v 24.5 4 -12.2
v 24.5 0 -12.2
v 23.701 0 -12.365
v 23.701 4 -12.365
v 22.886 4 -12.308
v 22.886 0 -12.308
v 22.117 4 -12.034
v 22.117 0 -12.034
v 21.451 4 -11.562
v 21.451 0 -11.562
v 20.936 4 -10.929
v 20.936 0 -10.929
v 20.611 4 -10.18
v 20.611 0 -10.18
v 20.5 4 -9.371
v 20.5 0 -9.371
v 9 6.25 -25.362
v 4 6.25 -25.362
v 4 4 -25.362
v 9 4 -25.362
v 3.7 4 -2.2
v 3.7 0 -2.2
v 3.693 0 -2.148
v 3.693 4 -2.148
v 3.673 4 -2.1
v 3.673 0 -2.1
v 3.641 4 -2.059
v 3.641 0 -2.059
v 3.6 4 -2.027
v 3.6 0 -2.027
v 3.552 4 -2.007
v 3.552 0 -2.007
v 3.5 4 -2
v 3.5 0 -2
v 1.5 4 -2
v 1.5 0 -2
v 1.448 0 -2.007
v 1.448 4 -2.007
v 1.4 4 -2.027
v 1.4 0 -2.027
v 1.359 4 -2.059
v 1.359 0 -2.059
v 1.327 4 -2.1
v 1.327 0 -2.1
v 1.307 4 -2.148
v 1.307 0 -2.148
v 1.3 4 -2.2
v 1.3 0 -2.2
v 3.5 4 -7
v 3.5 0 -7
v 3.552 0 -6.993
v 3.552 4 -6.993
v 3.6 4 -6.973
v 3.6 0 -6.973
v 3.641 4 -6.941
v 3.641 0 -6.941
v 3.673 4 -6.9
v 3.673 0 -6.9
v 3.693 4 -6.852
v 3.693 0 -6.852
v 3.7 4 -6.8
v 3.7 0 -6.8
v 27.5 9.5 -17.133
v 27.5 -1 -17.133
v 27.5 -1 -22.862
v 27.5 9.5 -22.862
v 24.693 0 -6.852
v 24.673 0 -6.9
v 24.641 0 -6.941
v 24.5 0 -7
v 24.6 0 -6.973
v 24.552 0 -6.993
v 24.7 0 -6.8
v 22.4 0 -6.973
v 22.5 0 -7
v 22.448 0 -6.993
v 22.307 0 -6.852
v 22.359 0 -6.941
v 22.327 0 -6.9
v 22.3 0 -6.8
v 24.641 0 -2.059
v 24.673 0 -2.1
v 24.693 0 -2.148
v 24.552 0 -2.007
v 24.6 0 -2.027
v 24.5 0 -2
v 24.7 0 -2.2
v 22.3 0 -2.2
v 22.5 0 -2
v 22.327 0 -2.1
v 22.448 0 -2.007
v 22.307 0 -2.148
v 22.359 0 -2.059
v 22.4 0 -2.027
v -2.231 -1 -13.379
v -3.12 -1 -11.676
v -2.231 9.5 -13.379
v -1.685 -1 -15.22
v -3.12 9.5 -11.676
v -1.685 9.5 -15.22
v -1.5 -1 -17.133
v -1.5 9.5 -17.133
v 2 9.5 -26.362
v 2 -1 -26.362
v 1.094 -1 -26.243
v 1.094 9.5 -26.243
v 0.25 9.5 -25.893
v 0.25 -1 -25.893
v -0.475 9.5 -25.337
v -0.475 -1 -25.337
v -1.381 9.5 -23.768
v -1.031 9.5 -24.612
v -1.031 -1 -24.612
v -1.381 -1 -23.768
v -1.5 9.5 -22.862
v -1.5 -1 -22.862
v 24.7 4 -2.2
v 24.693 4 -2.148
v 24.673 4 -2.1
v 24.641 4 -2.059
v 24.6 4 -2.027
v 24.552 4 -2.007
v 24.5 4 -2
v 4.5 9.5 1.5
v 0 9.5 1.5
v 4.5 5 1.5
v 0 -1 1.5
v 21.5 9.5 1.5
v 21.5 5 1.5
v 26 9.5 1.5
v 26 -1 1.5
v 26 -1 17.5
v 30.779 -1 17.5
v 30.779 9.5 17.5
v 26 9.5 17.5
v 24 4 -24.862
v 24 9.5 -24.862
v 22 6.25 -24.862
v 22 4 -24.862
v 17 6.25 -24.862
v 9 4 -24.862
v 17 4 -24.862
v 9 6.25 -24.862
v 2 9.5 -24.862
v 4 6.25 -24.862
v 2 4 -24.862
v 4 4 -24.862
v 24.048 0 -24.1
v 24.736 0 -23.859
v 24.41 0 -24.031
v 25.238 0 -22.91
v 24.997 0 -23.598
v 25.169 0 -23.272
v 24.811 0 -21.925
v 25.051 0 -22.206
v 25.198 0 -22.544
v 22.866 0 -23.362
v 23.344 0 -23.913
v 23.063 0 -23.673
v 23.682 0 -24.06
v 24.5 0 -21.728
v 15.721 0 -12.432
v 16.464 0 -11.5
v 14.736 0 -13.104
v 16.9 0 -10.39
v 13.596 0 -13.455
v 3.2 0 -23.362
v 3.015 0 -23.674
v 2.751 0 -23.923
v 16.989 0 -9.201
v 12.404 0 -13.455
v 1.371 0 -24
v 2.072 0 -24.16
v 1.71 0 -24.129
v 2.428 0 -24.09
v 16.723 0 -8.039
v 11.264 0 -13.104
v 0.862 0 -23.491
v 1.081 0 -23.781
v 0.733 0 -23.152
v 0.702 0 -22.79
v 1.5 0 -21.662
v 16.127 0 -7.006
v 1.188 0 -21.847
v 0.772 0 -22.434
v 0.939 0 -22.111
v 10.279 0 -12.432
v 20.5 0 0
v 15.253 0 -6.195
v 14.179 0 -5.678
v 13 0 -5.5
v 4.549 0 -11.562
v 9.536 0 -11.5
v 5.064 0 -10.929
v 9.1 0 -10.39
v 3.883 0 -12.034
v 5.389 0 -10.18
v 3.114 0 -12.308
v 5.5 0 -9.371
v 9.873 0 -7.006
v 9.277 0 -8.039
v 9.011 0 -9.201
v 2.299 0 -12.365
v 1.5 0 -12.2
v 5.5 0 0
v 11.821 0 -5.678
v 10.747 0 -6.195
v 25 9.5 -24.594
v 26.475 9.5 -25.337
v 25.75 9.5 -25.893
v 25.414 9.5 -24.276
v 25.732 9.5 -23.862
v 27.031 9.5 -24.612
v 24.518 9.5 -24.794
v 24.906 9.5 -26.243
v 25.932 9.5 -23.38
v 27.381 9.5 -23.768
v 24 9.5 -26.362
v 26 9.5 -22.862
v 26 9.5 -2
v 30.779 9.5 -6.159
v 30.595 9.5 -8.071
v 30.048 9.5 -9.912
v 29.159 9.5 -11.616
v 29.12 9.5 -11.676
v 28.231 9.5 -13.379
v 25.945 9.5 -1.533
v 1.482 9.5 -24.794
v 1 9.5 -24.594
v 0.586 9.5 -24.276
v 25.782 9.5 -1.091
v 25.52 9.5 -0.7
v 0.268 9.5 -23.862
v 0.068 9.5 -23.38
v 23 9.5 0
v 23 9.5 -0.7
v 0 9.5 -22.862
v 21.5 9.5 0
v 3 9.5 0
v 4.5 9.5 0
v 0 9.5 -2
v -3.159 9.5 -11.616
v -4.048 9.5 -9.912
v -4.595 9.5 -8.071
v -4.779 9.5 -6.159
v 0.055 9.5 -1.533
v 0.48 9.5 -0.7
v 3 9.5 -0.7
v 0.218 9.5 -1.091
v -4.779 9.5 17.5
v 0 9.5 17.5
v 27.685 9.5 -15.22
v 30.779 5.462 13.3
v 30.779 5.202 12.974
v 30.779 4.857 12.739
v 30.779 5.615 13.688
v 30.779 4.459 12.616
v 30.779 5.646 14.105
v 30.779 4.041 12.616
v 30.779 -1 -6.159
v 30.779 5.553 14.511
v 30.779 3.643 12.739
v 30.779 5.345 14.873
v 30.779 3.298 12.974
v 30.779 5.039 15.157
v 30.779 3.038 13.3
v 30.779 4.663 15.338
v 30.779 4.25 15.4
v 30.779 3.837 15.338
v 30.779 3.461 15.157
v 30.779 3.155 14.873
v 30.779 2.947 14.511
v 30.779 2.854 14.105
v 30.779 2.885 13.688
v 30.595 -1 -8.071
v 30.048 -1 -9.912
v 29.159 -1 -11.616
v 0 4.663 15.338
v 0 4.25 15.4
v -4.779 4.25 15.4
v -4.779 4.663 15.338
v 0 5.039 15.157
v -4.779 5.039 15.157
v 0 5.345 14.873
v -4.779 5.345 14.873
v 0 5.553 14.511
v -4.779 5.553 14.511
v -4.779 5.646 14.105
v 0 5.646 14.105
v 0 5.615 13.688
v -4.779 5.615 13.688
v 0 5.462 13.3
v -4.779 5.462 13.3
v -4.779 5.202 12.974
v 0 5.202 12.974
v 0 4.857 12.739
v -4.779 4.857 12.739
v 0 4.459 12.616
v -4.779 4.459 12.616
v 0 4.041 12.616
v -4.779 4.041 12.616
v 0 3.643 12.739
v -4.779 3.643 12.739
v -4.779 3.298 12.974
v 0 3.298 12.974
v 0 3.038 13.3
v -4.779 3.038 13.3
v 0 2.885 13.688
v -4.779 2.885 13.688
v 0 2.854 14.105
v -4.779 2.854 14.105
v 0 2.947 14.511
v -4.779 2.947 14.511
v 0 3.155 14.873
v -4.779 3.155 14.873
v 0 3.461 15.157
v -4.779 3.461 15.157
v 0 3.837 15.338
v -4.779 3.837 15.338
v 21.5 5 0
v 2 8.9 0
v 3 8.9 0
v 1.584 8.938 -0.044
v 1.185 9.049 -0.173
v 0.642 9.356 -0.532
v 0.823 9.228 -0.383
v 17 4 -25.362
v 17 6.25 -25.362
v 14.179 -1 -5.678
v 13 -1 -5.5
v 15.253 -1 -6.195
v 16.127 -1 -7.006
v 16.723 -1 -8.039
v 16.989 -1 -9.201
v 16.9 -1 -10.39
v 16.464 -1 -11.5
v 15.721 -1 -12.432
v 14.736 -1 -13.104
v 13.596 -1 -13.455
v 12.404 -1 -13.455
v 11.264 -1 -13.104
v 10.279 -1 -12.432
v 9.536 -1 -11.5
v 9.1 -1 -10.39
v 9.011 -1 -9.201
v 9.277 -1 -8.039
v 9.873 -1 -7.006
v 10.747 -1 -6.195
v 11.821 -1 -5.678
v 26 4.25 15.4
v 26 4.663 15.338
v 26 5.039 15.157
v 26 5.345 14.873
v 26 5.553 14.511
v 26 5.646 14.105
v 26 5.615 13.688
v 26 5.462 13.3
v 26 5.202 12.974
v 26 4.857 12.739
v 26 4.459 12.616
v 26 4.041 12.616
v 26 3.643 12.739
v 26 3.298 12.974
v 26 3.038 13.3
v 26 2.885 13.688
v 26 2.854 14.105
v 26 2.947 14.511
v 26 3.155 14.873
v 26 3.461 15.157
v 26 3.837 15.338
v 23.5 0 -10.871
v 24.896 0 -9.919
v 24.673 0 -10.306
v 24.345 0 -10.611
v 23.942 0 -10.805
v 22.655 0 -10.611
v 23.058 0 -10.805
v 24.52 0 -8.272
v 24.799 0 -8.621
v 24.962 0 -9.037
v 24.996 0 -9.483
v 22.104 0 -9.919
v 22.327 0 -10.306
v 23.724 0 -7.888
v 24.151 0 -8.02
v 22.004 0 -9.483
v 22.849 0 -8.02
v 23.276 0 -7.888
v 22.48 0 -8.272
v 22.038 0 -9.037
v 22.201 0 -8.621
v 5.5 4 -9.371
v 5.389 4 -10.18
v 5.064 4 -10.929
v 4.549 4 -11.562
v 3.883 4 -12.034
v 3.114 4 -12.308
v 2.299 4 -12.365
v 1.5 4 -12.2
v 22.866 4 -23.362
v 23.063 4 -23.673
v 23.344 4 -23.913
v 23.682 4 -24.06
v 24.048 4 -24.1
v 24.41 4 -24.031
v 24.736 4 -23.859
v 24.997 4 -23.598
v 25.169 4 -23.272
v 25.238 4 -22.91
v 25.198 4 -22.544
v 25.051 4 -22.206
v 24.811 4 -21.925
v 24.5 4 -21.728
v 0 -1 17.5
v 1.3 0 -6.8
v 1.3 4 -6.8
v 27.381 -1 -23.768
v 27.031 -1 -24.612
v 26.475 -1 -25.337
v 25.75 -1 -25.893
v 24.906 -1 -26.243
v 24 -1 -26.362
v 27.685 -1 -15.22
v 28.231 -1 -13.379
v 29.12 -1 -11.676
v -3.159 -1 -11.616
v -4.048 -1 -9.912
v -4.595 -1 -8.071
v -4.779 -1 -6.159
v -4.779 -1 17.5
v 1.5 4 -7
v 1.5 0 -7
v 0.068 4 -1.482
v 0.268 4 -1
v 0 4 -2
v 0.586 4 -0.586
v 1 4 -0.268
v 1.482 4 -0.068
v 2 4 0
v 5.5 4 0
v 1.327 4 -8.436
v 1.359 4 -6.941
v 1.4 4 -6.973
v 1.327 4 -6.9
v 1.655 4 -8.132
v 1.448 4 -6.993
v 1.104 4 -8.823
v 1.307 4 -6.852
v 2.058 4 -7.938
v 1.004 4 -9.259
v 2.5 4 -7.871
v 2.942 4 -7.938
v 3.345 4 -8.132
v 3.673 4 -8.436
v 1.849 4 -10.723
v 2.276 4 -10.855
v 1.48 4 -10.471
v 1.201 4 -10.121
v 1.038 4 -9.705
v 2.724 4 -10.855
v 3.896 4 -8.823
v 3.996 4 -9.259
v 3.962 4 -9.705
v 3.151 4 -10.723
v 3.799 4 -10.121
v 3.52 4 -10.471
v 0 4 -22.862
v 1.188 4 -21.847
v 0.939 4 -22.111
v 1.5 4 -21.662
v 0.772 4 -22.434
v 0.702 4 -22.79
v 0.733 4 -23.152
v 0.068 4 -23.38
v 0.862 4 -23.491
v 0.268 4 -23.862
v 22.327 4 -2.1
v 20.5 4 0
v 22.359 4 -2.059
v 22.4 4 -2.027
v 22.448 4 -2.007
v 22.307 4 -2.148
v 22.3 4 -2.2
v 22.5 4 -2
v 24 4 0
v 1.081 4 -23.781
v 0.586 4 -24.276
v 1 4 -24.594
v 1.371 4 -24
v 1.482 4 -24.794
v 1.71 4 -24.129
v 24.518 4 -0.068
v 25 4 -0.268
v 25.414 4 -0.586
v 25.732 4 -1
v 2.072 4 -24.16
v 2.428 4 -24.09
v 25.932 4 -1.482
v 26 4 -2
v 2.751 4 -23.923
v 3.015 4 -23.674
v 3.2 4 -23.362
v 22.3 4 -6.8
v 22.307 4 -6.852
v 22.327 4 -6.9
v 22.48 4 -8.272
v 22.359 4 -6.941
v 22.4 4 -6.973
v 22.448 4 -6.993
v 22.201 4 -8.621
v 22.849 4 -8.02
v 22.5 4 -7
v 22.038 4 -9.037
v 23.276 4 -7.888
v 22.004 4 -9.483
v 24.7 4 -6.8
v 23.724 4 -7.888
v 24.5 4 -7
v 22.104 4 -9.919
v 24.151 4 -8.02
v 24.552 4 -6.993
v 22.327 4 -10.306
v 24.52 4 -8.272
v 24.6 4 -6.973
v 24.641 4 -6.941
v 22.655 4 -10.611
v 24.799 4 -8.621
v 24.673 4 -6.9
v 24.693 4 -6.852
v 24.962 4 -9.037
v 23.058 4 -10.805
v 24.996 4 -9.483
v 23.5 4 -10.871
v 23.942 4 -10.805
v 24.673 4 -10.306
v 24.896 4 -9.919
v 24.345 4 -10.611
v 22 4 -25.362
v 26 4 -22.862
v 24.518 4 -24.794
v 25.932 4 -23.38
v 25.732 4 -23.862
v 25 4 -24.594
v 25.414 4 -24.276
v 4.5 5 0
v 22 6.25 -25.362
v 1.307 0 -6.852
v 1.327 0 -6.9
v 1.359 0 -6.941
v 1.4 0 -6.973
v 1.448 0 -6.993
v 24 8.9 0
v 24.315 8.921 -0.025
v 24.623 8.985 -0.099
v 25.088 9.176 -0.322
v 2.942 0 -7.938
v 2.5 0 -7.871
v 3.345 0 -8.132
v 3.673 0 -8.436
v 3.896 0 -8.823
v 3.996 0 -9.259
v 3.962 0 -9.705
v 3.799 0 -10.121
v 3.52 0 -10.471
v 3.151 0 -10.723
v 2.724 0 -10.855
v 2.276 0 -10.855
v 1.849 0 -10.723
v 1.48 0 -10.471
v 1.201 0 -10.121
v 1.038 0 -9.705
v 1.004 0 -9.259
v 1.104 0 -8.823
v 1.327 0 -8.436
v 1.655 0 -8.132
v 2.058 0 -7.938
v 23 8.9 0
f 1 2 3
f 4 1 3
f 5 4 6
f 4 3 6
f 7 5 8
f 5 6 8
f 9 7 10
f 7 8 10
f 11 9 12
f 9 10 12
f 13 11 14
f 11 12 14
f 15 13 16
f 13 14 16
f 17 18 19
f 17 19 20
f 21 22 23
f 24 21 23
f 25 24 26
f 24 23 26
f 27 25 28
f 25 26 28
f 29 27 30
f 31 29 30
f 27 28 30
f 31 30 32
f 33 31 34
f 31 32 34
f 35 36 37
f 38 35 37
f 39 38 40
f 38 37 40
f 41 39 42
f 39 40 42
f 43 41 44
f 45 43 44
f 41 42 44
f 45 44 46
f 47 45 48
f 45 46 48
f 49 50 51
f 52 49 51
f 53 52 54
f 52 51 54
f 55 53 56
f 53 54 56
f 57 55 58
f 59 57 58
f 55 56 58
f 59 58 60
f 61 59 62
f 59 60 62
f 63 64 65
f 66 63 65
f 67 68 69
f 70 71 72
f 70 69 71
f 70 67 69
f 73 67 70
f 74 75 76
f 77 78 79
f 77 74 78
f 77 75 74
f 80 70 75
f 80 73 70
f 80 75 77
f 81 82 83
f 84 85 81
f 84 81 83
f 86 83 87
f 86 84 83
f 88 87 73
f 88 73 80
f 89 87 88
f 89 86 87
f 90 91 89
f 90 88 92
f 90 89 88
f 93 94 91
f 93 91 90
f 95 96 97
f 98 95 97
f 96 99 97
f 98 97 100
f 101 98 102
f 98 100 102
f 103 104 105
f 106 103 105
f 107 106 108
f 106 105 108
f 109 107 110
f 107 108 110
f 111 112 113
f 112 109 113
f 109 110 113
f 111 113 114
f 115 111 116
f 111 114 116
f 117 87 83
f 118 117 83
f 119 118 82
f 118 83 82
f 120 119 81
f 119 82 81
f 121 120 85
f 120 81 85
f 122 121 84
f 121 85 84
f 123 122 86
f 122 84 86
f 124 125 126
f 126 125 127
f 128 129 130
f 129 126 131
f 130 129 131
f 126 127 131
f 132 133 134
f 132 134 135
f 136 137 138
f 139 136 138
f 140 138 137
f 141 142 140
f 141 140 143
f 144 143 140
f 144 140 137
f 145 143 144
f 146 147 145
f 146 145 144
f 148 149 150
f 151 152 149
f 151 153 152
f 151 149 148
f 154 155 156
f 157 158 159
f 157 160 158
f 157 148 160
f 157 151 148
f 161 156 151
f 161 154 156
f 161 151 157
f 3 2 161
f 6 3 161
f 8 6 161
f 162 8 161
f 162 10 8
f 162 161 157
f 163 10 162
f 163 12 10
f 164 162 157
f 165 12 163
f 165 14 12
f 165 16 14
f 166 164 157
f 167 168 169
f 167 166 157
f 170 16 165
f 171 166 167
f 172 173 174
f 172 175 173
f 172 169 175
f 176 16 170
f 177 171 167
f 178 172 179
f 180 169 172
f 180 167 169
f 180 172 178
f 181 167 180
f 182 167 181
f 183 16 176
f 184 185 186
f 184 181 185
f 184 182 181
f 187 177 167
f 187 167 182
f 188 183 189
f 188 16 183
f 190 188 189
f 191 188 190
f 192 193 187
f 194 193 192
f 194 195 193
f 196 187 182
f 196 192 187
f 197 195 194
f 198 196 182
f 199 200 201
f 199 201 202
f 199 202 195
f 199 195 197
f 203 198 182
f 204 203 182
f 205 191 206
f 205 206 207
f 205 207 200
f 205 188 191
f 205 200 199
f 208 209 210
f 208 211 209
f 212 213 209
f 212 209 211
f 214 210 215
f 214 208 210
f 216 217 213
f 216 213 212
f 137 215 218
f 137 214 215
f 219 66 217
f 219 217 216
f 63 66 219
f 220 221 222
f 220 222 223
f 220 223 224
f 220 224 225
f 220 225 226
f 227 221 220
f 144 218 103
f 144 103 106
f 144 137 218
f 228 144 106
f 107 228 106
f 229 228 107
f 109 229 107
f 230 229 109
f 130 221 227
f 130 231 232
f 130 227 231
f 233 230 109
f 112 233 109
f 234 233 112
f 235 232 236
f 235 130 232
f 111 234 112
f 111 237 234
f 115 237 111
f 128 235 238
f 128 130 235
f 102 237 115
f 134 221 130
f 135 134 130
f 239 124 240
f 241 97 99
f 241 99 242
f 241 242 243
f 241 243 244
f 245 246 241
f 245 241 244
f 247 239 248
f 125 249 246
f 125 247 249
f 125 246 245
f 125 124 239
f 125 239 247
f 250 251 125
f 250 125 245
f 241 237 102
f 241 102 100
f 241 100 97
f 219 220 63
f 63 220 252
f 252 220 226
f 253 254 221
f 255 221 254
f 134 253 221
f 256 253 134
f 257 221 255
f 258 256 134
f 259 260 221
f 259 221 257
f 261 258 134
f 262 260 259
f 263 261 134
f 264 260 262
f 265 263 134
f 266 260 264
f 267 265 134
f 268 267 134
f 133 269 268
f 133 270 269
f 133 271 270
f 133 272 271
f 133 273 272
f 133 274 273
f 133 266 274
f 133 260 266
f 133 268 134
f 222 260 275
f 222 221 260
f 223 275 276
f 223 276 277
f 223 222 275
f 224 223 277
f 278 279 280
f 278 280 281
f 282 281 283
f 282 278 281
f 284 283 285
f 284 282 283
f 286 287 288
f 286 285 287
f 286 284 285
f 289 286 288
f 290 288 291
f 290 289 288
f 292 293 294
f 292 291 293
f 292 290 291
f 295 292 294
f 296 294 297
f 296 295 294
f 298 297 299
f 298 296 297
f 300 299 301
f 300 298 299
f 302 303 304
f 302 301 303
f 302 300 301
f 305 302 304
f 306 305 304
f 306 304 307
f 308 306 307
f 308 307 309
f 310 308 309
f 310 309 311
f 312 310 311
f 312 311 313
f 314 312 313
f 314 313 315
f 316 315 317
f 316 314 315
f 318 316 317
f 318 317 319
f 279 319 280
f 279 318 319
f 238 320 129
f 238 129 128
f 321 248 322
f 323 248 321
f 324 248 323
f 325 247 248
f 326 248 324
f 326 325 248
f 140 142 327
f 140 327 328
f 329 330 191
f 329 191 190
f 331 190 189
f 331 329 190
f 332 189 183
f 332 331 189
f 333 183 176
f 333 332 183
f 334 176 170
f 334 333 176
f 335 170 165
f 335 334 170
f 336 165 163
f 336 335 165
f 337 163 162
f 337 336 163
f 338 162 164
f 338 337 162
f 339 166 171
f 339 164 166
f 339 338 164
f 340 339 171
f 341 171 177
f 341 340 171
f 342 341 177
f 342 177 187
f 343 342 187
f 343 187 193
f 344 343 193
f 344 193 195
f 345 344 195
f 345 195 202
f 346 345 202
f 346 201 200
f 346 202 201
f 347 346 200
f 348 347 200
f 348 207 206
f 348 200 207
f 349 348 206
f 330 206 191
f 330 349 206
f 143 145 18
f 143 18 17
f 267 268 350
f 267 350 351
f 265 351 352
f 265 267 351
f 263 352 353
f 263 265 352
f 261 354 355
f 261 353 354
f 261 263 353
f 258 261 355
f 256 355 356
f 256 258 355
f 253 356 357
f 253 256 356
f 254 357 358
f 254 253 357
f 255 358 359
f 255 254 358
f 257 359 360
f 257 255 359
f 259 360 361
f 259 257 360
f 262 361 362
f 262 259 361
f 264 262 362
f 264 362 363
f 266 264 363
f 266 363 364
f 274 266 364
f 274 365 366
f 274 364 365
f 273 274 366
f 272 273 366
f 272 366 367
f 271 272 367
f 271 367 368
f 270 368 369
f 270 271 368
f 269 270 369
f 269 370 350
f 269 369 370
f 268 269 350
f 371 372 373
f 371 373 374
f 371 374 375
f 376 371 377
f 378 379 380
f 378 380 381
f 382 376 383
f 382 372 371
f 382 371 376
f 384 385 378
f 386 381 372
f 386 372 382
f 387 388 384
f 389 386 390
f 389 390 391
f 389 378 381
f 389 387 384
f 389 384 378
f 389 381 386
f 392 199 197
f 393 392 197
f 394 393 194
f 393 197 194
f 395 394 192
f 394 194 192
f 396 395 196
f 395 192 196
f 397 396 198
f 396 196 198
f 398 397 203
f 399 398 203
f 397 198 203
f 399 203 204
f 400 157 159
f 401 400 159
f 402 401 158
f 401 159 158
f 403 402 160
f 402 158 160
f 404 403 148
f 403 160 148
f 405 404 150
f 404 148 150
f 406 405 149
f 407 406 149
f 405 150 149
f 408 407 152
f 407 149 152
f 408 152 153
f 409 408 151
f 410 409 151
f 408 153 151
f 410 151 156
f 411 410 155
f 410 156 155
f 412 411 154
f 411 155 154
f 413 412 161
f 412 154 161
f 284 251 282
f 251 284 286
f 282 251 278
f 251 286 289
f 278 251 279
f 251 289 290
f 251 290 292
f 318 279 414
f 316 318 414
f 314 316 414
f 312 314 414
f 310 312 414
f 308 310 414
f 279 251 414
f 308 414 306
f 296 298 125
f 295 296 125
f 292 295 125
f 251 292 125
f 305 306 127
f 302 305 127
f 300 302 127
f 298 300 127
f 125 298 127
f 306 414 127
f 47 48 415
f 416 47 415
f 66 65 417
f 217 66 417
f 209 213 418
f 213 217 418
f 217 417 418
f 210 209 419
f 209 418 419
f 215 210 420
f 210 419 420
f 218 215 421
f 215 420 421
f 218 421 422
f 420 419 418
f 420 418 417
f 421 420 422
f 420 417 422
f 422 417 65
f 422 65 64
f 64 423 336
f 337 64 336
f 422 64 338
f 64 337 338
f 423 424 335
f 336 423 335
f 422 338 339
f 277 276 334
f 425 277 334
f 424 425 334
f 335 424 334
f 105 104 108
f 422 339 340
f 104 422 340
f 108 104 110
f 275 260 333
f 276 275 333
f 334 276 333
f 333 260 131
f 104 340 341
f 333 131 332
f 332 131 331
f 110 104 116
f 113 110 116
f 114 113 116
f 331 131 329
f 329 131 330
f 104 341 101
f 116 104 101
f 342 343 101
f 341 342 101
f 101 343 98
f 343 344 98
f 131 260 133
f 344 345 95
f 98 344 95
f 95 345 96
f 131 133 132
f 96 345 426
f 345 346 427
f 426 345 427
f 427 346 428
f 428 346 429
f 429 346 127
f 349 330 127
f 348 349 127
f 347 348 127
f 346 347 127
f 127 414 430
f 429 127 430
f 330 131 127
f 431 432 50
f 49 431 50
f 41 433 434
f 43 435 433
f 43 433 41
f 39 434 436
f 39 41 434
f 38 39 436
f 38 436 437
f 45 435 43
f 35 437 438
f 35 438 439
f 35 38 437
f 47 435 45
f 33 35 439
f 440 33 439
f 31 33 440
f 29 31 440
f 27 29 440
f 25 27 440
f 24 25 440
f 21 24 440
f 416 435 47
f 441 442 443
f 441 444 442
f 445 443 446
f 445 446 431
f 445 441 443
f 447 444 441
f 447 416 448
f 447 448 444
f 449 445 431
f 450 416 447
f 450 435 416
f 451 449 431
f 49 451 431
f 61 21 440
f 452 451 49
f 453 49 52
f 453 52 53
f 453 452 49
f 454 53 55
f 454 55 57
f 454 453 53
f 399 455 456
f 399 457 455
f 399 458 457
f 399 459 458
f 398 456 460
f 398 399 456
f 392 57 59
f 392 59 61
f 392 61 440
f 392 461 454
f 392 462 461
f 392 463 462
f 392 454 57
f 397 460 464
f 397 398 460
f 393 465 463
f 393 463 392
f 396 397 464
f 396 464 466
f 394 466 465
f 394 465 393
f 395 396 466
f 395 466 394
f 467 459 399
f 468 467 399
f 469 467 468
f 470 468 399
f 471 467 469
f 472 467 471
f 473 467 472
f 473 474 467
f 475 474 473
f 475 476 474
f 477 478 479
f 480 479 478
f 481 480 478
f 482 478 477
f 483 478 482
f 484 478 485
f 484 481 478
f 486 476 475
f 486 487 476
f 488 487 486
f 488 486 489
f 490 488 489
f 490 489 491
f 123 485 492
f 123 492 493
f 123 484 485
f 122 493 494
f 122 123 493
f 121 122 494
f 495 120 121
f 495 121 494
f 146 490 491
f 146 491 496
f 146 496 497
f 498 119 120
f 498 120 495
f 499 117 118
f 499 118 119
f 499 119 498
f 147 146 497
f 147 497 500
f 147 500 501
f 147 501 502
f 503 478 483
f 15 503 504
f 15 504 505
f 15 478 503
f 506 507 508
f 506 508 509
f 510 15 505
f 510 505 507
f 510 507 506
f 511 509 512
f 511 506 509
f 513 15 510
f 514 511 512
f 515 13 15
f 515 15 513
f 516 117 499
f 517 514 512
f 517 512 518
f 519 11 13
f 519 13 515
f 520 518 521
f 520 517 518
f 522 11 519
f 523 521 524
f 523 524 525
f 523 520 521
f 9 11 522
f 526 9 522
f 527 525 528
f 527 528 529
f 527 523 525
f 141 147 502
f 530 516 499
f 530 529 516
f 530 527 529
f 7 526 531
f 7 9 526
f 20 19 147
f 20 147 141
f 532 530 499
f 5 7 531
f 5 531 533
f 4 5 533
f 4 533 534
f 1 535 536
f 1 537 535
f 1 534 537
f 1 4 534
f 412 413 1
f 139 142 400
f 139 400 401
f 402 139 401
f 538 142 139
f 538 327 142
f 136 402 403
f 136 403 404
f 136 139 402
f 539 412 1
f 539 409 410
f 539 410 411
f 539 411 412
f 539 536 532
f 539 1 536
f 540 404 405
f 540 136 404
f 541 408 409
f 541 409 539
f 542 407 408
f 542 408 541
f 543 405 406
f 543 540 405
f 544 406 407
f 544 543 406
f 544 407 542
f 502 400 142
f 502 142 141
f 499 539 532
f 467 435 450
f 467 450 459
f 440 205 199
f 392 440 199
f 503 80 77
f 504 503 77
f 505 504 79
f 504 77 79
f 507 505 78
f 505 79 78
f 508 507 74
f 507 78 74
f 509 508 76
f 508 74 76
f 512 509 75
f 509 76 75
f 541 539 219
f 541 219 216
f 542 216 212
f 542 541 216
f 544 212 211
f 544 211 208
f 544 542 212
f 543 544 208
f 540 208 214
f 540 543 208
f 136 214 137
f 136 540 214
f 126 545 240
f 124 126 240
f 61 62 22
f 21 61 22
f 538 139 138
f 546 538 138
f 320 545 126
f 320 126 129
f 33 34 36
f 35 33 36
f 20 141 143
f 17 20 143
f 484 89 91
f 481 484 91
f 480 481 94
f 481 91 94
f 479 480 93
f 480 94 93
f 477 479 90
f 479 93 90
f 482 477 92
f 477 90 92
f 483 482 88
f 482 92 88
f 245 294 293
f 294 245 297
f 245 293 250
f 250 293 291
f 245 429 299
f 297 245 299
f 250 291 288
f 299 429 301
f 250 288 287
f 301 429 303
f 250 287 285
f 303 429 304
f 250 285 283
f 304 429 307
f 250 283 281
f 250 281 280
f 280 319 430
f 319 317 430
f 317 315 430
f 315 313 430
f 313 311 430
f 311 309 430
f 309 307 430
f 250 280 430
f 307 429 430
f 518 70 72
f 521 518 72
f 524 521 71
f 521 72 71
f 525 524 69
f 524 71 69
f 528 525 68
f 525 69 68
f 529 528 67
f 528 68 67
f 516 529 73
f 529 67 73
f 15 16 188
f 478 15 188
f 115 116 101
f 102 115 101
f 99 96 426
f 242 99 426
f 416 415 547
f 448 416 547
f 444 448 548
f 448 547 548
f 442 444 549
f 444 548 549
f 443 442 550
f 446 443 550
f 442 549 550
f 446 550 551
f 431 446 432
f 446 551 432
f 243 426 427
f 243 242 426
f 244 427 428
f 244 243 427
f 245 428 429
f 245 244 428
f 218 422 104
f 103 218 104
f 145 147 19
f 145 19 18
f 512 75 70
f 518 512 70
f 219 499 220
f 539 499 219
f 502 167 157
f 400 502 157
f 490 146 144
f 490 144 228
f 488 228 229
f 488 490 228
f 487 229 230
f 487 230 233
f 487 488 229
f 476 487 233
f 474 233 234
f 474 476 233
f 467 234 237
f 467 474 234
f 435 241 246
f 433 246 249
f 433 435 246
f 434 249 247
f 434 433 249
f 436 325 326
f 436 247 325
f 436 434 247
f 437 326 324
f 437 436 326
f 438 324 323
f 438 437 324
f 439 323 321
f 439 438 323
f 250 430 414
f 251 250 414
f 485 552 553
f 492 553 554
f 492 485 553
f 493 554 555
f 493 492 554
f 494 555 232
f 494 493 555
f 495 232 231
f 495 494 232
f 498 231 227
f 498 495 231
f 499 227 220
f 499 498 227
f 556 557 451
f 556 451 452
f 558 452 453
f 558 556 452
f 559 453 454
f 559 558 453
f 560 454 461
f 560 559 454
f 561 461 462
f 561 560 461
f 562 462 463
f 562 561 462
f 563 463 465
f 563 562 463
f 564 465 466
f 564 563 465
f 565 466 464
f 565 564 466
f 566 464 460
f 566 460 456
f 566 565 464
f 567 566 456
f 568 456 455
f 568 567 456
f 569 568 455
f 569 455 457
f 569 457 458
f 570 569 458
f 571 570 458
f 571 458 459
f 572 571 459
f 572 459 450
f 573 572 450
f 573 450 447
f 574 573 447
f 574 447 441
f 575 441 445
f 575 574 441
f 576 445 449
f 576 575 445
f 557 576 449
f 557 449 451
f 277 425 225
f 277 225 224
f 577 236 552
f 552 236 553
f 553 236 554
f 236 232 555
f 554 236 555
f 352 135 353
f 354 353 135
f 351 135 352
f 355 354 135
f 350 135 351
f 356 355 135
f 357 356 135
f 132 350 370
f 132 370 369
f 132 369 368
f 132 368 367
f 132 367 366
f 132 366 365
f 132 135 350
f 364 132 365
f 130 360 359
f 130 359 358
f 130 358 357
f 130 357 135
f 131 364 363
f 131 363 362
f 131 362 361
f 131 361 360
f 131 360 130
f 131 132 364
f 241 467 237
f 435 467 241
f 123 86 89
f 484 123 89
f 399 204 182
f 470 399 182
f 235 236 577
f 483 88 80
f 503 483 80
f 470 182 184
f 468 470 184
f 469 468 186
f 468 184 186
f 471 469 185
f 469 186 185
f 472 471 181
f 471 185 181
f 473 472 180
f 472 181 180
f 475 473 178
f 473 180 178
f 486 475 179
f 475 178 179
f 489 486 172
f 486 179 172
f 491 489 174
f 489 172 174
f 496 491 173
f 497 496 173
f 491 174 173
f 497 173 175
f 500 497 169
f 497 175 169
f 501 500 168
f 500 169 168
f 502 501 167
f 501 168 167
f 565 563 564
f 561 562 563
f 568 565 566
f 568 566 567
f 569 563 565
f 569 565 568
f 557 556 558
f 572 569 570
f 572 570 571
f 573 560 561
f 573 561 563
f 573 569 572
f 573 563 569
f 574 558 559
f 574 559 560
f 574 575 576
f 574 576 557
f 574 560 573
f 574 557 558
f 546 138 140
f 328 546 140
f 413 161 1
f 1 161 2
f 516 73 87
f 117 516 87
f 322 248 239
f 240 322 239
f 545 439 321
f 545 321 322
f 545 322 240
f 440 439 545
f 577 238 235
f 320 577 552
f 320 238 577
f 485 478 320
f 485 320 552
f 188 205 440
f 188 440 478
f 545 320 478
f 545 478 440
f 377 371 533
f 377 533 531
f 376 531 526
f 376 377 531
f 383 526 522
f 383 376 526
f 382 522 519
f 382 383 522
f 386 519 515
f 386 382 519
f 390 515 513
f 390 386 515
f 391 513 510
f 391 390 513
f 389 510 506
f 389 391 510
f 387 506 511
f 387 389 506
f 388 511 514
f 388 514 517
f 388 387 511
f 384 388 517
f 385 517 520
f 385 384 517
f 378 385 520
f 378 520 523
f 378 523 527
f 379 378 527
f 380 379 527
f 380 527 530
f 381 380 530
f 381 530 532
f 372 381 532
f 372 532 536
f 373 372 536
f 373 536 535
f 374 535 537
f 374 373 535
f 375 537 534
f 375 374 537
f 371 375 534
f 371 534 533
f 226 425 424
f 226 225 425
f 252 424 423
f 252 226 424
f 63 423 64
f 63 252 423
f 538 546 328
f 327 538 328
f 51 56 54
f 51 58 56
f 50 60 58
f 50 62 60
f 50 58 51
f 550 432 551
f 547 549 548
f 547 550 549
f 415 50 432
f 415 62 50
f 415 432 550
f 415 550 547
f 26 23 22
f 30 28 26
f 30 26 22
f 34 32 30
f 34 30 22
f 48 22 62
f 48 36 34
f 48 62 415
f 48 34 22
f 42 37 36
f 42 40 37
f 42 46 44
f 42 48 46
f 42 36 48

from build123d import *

# Parameters (mm, degrees)
BOSS_EXTRUDE1_DEPTH     = 9.5
BOSS_EXTRUDE2_START     = 1
BOSS_EXTRUDE2_DEPTH     = 1
CUT_EXTRUDE1_DEPTH      = 40.261368341
CUT_EXTRUDE1_DEPTH_BACK = 40.261368341
SKETCH4_R               = 4
SKETCH5_R               = 1.5
BOSS_EXTRUDE3_DEPTH     = 4
CUT_EXTRUDE2_DEPTH      = 41.283880697
CUT_EXTRUDE2_DEPTH_BACK = 3
SKETCH6_W               = 17
SKETCH6_H               = 4.5
BOSS_EXTRUDE4_DEPTH     = 10.5
CUT_EXTRUDE3_DEPTH      = 46.272780922
CUT_EXTRUDE3_DEPTH_BACK = 46.272780922
SKETCH9_R               = 1.4
FILLET1_R               = 10
BOSS_EXTRUDE6_DEPTH     = 3
SKETCH14_W              = 5
SKETCH14_H              = 2.25
CUT_EXTRUDE4_DEPTH      = 0.5


with BuildPart() as part:
    # Sketch1 → Boss-Extrude1 (new body)
    with BuildSketch(Plane(origin=(0, 0, 0), x_dir=(1, 0, 0), z_dir=(0, 1, 0))):
        with BuildLine():
            Line((-1.5, 2), (-1.5, 22.862))
            ThreePointArc((-1.5, 22.862), (-0.474873734, 25.336873734), (2, 26.362))
            Line((2, 26.362), (24, 26.362))
            ThreePointArc((24, 26.362), (26.474873734, 25.336873734), (27.5, 22.862))
            Line((27.5, 22.862), (27.5, 2))
            Line((27.5, 2), (27.5, -1.5))
            Line((27.5, -1.5), (24, -1.5))
            Line((24, -1.5), (2, -1.5))
            Line((2, -1.5), (-1.5, -1.5))
            Line((-1.5, -1.5), (-1.5, 2))
        make_face()
        with BuildLine():
            Line((2, 0), (24, 0))
            ThreePointArc((24, 0), (25.414213562, 0.585786438), (26, 2))
            Line((26, 2), (26, 22.862))
            ThreePointArc((26, 22.862), (25.414213562, 24.276213562), (24, 24.862))
            Line((24, 24.862), (2, 24.862))
            ThreePointArc((2, 24.862), (0.585786438, 24.276213562), (0, 22.862))
            Line((0, 22.862), (0, 2))
            ThreePointArc((0, 2), (0.585786438, 0.585786438), (2, 0))
        make_face(mode=Mode.SUBTRACT)
    extrude(amount=BOSS_EXTRUDE1_DEPTH)

    # Sketch3 → Boss-Extrude2 (add)
    with BuildSketch(Plane.XZ.offset(BOSS_EXTRUDE2_START)):
        with BuildLine():
            Line((24, -26.362), (2, -26.362))
            ThreePointArc((2, -26.362), (-0.474873734, -25.336873734), (-1.5, -22.862))
            Line((-1.5, -22.862), (-1.5, 1.5))
            Line((-1.5, 1.5), (27.5, 1.5))
            Line((27.5, 1.5), (27.5, -22.862))
            ThreePointArc((27.5, -22.862), (26.474873734, -25.336873734), (24, -26.362))
        make_face()
    extrude(amount=-BOSS_EXTRUDE2_DEPTH)

    # Sketch4 → Cut-Extrude1 (cut, two sides: drawn at the far end of the back side and taken through both)
    with BuildSketch(Plane(origin=(0, 0, 0), x_dir=(1, 0, 0), z_dir=(0, 1, 0)).offset(-CUT_EXTRUDE1_DEPTH_BACK)):
        with Locations(Location((13, 9.5, 0), (0, 0, 270))):
            Circle(SKETCH4_R)
    extrude(amount=CUT_EXTRUDE1_DEPTH + CUT_EXTRUDE1_DEPTH_BACK, mode=Mode.SUBTRACT)

    # Sketch5 → Boss-Extrude3 (add)
    with BuildSketch(Plane(origin=(0, 0, 0), x_dir=(1, 0, 0), z_dir=(0, 1, 0))):
        with BuildLine():
            Line((3.2, 23.362), (22.866091564, 23.362))
            ThreePointArc((22.866091564, 23.362), (24.876284298, 23.738284298), (24.5, 21.728091564))
            Line((24.5, 21.728091564), (24.5, 12.199689562))
            ThreePointArc((24.5, 12.199689562), (21.767949192, 11.82075218), (20.5, 9.371262437))
            Line((20.5, 9.371262437), (20.5, 0))
            Line((20.5, 0), (24, 0))
            ThreePointArc((24, 0), (25.414213562, 0.585786438), (26, 2))
            Line((26, 2), (26, 22.862))
            ThreePointArc((26, 22.862), (25.414213562, 24.276213562), (24, 24.862))
            Line((24, 24.862), (2, 24.862))
            ThreePointArc((2, 24.862), (0.585786438, 24.276213562), (0, 22.862))
            Line((0, 22.862), (0, 2))
            ThreePointArc((0, 2), (0.585786438, 0.585786438), (2, 0))
            Line((2, 0), (5.5, 0))
            Line((5.5, 0), (5.5, 9.371262437))
            ThreePointArc((5.5, 9.371262437), (4.232050808, 11.82075218), (1.5, 12.199689562))
            Line((1.5, 12.199689562), (1.5, 21.662))
            ThreePointArc((1.5, 21.662), (1.080761184, 23.781238816), (3.2, 23.362))
        make_face()
        with BuildLine():
            Line((3.5, 2), (1.5, 2))
            ThreePointArc((1.5, 2), (1.358578644, 2.058578644), (1.3, 2.2))
            Line((1.3, 2.2), (1.3, 6.8))
            ThreePointArc((1.3, 6.8), (1.358578644, 6.941421356), (1.5, 7))
            Line((1.5, 7), (3.5, 7))
            ThreePointArc((3.5, 7), (3.641421356, 6.941421356), (3.7, 6.8))
            Line((3.7, 6.8), (3.7, 2.2))
            ThreePointArc((3.7, 2.2), (3.641421356, 2.058578644), (3.5, 2))
        make_face(mode=Mode.SUBTRACT)
        with Locations(Location((2.5, 9.371262437, 0), (0, 0, 270))):
            Circle(SKETCH5_R, mode=Mode.SUBTRACT)
        with BuildLine():
            ThreePointArc((22.5, 2), (22.358578644, 2.058578644), (22.3, 2.2))
            Line((22.3, 2.2), (22.3, 6.8))
            ThreePointArc((22.3, 6.8), (22.358578644, 6.941421356), (22.5, 7))
            Line((22.5, 7), (24.5, 7))
            ThreePointArc((24.5, 7), (24.641421356, 6.941421356), (24.7, 6.8))
            Line((24.7, 6.8), (24.7, 2.2))
            ThreePointArc((24.7, 2.2), (24.641421356, 2.058578644), (24.5, 2))
            Line((24.5, 2), (22.5, 2))
        make_face(mode=Mode.SUBTRACT)
        with Locations(Location((23.5, 9.371262437, 0), (0, 0, 90))):
            Circle(SKETCH5_R, mode=Mode.SUBTRACT)
    extrude(amount=BOSS_EXTRUDE3_DEPTH)

    # Sketch6 → Cut-Extrude2 (cut, two sides: drawn at the far end of the back side and taken through both)
    with BuildSketch(Plane.XY.offset(1.5).offset(-CUT_EXTRUDE2_DEPTH_BACK)):
        with Locations((13, 7.25)):
            Rectangle(SKETCH6_W, SKETCH6_H)
    extrude(amount=CUT_EXTRUDE2_DEPTH + CUT_EXTRUDE2_DEPTH_BACK, mode=Mode.SUBTRACT)

    # Sketch7 → Boss-Extrude4 (add)
    with BuildSketch(Plane.XZ.offset(1)):
        Polygon((27.5, -14.163598373), (30.779339473, -9.127595345), (30.779339473, 17.5), (26, 17.5), (26, 1.5), (27.5, 1.5), align=None)
    boss_extrude4 = extrude(amount=-BOSS_EXTRUDE4_DEPTH)

    # Mirror1: Boss-Extrude4 across plane
    add(boss_extrude4.mirror(Plane(origin=(13, 0, 0), x_dir=(0, 0, 1), z_dir=(1, 0, 0))))

    # Sketch9 → Cut-Extrude3 (cut, two sides: drawn at the far end of the back side and taken through both)
    with BuildSketch(Plane.ZY.offset(4.779339473).offset(-CUT_EXTRUDE3_DEPTH_BACK)):
        with Locations((14, 4.25)):
            Circle(SKETCH9_R)
    extrude(amount=CUT_EXTRUDE3_DEPTH + CUT_EXTRUDE3_DEPTH_BACK, mode=Mode.SUBTRACT)

    # Fillet1
    fillet1_edges = [part.edges().sort_by_distance(p)[0] for p in [
        (30.779339473, 4.25, -9.127595345),
        (27.5, 4.25, -14.163598373),
        (-1.5, 4.25, -14.163598373),
        (-4.779339473, 4.25, -9.127595345),
    ]]
    fillet(fillet1_edges, radius=FILLET1_R)

    # Sketch13 → Boss-Extrude6 (add)
    with BuildSketch(Plane(origin=(0, 0, 0), x_dir=(0, 0, -1), z_dir=(1, 0, 0))):
        Polygon((0, 9.5), (0.7, 9.5), (0, 8.9), align=None)
    boss_extrude6 = extrude(amount=BOSS_EXTRUDE6_DEPTH)

    # Sketch14 → Cut-Extrude4 (cut)
    with BuildSketch(Plane.XY.offset(-24.862)):
        with Locations((6.5, 5.125)):
            Rectangle(SKETCH14_W, SKETCH14_H)
    cut_extrude4 = extrude(amount=-CUT_EXTRUDE4_DEPTH, mode=Mode.SUBTRACT)

    # Mirror3: Boss-Extrude6, Cut-Extrude4 across plane
    add(boss_extrude6.mirror(Plane(origin=(13, 0, 0), x_dir=(0, 0, 1), z_dir=(1, 0, 0))))
    add(cut_extrude4.mirror(Plane(origin=(13, 0, 0), x_dir=(0, 0, 1), z_dir=(1, 0, 0))), mode=Mode.SUBTRACT)


solid = part.part
